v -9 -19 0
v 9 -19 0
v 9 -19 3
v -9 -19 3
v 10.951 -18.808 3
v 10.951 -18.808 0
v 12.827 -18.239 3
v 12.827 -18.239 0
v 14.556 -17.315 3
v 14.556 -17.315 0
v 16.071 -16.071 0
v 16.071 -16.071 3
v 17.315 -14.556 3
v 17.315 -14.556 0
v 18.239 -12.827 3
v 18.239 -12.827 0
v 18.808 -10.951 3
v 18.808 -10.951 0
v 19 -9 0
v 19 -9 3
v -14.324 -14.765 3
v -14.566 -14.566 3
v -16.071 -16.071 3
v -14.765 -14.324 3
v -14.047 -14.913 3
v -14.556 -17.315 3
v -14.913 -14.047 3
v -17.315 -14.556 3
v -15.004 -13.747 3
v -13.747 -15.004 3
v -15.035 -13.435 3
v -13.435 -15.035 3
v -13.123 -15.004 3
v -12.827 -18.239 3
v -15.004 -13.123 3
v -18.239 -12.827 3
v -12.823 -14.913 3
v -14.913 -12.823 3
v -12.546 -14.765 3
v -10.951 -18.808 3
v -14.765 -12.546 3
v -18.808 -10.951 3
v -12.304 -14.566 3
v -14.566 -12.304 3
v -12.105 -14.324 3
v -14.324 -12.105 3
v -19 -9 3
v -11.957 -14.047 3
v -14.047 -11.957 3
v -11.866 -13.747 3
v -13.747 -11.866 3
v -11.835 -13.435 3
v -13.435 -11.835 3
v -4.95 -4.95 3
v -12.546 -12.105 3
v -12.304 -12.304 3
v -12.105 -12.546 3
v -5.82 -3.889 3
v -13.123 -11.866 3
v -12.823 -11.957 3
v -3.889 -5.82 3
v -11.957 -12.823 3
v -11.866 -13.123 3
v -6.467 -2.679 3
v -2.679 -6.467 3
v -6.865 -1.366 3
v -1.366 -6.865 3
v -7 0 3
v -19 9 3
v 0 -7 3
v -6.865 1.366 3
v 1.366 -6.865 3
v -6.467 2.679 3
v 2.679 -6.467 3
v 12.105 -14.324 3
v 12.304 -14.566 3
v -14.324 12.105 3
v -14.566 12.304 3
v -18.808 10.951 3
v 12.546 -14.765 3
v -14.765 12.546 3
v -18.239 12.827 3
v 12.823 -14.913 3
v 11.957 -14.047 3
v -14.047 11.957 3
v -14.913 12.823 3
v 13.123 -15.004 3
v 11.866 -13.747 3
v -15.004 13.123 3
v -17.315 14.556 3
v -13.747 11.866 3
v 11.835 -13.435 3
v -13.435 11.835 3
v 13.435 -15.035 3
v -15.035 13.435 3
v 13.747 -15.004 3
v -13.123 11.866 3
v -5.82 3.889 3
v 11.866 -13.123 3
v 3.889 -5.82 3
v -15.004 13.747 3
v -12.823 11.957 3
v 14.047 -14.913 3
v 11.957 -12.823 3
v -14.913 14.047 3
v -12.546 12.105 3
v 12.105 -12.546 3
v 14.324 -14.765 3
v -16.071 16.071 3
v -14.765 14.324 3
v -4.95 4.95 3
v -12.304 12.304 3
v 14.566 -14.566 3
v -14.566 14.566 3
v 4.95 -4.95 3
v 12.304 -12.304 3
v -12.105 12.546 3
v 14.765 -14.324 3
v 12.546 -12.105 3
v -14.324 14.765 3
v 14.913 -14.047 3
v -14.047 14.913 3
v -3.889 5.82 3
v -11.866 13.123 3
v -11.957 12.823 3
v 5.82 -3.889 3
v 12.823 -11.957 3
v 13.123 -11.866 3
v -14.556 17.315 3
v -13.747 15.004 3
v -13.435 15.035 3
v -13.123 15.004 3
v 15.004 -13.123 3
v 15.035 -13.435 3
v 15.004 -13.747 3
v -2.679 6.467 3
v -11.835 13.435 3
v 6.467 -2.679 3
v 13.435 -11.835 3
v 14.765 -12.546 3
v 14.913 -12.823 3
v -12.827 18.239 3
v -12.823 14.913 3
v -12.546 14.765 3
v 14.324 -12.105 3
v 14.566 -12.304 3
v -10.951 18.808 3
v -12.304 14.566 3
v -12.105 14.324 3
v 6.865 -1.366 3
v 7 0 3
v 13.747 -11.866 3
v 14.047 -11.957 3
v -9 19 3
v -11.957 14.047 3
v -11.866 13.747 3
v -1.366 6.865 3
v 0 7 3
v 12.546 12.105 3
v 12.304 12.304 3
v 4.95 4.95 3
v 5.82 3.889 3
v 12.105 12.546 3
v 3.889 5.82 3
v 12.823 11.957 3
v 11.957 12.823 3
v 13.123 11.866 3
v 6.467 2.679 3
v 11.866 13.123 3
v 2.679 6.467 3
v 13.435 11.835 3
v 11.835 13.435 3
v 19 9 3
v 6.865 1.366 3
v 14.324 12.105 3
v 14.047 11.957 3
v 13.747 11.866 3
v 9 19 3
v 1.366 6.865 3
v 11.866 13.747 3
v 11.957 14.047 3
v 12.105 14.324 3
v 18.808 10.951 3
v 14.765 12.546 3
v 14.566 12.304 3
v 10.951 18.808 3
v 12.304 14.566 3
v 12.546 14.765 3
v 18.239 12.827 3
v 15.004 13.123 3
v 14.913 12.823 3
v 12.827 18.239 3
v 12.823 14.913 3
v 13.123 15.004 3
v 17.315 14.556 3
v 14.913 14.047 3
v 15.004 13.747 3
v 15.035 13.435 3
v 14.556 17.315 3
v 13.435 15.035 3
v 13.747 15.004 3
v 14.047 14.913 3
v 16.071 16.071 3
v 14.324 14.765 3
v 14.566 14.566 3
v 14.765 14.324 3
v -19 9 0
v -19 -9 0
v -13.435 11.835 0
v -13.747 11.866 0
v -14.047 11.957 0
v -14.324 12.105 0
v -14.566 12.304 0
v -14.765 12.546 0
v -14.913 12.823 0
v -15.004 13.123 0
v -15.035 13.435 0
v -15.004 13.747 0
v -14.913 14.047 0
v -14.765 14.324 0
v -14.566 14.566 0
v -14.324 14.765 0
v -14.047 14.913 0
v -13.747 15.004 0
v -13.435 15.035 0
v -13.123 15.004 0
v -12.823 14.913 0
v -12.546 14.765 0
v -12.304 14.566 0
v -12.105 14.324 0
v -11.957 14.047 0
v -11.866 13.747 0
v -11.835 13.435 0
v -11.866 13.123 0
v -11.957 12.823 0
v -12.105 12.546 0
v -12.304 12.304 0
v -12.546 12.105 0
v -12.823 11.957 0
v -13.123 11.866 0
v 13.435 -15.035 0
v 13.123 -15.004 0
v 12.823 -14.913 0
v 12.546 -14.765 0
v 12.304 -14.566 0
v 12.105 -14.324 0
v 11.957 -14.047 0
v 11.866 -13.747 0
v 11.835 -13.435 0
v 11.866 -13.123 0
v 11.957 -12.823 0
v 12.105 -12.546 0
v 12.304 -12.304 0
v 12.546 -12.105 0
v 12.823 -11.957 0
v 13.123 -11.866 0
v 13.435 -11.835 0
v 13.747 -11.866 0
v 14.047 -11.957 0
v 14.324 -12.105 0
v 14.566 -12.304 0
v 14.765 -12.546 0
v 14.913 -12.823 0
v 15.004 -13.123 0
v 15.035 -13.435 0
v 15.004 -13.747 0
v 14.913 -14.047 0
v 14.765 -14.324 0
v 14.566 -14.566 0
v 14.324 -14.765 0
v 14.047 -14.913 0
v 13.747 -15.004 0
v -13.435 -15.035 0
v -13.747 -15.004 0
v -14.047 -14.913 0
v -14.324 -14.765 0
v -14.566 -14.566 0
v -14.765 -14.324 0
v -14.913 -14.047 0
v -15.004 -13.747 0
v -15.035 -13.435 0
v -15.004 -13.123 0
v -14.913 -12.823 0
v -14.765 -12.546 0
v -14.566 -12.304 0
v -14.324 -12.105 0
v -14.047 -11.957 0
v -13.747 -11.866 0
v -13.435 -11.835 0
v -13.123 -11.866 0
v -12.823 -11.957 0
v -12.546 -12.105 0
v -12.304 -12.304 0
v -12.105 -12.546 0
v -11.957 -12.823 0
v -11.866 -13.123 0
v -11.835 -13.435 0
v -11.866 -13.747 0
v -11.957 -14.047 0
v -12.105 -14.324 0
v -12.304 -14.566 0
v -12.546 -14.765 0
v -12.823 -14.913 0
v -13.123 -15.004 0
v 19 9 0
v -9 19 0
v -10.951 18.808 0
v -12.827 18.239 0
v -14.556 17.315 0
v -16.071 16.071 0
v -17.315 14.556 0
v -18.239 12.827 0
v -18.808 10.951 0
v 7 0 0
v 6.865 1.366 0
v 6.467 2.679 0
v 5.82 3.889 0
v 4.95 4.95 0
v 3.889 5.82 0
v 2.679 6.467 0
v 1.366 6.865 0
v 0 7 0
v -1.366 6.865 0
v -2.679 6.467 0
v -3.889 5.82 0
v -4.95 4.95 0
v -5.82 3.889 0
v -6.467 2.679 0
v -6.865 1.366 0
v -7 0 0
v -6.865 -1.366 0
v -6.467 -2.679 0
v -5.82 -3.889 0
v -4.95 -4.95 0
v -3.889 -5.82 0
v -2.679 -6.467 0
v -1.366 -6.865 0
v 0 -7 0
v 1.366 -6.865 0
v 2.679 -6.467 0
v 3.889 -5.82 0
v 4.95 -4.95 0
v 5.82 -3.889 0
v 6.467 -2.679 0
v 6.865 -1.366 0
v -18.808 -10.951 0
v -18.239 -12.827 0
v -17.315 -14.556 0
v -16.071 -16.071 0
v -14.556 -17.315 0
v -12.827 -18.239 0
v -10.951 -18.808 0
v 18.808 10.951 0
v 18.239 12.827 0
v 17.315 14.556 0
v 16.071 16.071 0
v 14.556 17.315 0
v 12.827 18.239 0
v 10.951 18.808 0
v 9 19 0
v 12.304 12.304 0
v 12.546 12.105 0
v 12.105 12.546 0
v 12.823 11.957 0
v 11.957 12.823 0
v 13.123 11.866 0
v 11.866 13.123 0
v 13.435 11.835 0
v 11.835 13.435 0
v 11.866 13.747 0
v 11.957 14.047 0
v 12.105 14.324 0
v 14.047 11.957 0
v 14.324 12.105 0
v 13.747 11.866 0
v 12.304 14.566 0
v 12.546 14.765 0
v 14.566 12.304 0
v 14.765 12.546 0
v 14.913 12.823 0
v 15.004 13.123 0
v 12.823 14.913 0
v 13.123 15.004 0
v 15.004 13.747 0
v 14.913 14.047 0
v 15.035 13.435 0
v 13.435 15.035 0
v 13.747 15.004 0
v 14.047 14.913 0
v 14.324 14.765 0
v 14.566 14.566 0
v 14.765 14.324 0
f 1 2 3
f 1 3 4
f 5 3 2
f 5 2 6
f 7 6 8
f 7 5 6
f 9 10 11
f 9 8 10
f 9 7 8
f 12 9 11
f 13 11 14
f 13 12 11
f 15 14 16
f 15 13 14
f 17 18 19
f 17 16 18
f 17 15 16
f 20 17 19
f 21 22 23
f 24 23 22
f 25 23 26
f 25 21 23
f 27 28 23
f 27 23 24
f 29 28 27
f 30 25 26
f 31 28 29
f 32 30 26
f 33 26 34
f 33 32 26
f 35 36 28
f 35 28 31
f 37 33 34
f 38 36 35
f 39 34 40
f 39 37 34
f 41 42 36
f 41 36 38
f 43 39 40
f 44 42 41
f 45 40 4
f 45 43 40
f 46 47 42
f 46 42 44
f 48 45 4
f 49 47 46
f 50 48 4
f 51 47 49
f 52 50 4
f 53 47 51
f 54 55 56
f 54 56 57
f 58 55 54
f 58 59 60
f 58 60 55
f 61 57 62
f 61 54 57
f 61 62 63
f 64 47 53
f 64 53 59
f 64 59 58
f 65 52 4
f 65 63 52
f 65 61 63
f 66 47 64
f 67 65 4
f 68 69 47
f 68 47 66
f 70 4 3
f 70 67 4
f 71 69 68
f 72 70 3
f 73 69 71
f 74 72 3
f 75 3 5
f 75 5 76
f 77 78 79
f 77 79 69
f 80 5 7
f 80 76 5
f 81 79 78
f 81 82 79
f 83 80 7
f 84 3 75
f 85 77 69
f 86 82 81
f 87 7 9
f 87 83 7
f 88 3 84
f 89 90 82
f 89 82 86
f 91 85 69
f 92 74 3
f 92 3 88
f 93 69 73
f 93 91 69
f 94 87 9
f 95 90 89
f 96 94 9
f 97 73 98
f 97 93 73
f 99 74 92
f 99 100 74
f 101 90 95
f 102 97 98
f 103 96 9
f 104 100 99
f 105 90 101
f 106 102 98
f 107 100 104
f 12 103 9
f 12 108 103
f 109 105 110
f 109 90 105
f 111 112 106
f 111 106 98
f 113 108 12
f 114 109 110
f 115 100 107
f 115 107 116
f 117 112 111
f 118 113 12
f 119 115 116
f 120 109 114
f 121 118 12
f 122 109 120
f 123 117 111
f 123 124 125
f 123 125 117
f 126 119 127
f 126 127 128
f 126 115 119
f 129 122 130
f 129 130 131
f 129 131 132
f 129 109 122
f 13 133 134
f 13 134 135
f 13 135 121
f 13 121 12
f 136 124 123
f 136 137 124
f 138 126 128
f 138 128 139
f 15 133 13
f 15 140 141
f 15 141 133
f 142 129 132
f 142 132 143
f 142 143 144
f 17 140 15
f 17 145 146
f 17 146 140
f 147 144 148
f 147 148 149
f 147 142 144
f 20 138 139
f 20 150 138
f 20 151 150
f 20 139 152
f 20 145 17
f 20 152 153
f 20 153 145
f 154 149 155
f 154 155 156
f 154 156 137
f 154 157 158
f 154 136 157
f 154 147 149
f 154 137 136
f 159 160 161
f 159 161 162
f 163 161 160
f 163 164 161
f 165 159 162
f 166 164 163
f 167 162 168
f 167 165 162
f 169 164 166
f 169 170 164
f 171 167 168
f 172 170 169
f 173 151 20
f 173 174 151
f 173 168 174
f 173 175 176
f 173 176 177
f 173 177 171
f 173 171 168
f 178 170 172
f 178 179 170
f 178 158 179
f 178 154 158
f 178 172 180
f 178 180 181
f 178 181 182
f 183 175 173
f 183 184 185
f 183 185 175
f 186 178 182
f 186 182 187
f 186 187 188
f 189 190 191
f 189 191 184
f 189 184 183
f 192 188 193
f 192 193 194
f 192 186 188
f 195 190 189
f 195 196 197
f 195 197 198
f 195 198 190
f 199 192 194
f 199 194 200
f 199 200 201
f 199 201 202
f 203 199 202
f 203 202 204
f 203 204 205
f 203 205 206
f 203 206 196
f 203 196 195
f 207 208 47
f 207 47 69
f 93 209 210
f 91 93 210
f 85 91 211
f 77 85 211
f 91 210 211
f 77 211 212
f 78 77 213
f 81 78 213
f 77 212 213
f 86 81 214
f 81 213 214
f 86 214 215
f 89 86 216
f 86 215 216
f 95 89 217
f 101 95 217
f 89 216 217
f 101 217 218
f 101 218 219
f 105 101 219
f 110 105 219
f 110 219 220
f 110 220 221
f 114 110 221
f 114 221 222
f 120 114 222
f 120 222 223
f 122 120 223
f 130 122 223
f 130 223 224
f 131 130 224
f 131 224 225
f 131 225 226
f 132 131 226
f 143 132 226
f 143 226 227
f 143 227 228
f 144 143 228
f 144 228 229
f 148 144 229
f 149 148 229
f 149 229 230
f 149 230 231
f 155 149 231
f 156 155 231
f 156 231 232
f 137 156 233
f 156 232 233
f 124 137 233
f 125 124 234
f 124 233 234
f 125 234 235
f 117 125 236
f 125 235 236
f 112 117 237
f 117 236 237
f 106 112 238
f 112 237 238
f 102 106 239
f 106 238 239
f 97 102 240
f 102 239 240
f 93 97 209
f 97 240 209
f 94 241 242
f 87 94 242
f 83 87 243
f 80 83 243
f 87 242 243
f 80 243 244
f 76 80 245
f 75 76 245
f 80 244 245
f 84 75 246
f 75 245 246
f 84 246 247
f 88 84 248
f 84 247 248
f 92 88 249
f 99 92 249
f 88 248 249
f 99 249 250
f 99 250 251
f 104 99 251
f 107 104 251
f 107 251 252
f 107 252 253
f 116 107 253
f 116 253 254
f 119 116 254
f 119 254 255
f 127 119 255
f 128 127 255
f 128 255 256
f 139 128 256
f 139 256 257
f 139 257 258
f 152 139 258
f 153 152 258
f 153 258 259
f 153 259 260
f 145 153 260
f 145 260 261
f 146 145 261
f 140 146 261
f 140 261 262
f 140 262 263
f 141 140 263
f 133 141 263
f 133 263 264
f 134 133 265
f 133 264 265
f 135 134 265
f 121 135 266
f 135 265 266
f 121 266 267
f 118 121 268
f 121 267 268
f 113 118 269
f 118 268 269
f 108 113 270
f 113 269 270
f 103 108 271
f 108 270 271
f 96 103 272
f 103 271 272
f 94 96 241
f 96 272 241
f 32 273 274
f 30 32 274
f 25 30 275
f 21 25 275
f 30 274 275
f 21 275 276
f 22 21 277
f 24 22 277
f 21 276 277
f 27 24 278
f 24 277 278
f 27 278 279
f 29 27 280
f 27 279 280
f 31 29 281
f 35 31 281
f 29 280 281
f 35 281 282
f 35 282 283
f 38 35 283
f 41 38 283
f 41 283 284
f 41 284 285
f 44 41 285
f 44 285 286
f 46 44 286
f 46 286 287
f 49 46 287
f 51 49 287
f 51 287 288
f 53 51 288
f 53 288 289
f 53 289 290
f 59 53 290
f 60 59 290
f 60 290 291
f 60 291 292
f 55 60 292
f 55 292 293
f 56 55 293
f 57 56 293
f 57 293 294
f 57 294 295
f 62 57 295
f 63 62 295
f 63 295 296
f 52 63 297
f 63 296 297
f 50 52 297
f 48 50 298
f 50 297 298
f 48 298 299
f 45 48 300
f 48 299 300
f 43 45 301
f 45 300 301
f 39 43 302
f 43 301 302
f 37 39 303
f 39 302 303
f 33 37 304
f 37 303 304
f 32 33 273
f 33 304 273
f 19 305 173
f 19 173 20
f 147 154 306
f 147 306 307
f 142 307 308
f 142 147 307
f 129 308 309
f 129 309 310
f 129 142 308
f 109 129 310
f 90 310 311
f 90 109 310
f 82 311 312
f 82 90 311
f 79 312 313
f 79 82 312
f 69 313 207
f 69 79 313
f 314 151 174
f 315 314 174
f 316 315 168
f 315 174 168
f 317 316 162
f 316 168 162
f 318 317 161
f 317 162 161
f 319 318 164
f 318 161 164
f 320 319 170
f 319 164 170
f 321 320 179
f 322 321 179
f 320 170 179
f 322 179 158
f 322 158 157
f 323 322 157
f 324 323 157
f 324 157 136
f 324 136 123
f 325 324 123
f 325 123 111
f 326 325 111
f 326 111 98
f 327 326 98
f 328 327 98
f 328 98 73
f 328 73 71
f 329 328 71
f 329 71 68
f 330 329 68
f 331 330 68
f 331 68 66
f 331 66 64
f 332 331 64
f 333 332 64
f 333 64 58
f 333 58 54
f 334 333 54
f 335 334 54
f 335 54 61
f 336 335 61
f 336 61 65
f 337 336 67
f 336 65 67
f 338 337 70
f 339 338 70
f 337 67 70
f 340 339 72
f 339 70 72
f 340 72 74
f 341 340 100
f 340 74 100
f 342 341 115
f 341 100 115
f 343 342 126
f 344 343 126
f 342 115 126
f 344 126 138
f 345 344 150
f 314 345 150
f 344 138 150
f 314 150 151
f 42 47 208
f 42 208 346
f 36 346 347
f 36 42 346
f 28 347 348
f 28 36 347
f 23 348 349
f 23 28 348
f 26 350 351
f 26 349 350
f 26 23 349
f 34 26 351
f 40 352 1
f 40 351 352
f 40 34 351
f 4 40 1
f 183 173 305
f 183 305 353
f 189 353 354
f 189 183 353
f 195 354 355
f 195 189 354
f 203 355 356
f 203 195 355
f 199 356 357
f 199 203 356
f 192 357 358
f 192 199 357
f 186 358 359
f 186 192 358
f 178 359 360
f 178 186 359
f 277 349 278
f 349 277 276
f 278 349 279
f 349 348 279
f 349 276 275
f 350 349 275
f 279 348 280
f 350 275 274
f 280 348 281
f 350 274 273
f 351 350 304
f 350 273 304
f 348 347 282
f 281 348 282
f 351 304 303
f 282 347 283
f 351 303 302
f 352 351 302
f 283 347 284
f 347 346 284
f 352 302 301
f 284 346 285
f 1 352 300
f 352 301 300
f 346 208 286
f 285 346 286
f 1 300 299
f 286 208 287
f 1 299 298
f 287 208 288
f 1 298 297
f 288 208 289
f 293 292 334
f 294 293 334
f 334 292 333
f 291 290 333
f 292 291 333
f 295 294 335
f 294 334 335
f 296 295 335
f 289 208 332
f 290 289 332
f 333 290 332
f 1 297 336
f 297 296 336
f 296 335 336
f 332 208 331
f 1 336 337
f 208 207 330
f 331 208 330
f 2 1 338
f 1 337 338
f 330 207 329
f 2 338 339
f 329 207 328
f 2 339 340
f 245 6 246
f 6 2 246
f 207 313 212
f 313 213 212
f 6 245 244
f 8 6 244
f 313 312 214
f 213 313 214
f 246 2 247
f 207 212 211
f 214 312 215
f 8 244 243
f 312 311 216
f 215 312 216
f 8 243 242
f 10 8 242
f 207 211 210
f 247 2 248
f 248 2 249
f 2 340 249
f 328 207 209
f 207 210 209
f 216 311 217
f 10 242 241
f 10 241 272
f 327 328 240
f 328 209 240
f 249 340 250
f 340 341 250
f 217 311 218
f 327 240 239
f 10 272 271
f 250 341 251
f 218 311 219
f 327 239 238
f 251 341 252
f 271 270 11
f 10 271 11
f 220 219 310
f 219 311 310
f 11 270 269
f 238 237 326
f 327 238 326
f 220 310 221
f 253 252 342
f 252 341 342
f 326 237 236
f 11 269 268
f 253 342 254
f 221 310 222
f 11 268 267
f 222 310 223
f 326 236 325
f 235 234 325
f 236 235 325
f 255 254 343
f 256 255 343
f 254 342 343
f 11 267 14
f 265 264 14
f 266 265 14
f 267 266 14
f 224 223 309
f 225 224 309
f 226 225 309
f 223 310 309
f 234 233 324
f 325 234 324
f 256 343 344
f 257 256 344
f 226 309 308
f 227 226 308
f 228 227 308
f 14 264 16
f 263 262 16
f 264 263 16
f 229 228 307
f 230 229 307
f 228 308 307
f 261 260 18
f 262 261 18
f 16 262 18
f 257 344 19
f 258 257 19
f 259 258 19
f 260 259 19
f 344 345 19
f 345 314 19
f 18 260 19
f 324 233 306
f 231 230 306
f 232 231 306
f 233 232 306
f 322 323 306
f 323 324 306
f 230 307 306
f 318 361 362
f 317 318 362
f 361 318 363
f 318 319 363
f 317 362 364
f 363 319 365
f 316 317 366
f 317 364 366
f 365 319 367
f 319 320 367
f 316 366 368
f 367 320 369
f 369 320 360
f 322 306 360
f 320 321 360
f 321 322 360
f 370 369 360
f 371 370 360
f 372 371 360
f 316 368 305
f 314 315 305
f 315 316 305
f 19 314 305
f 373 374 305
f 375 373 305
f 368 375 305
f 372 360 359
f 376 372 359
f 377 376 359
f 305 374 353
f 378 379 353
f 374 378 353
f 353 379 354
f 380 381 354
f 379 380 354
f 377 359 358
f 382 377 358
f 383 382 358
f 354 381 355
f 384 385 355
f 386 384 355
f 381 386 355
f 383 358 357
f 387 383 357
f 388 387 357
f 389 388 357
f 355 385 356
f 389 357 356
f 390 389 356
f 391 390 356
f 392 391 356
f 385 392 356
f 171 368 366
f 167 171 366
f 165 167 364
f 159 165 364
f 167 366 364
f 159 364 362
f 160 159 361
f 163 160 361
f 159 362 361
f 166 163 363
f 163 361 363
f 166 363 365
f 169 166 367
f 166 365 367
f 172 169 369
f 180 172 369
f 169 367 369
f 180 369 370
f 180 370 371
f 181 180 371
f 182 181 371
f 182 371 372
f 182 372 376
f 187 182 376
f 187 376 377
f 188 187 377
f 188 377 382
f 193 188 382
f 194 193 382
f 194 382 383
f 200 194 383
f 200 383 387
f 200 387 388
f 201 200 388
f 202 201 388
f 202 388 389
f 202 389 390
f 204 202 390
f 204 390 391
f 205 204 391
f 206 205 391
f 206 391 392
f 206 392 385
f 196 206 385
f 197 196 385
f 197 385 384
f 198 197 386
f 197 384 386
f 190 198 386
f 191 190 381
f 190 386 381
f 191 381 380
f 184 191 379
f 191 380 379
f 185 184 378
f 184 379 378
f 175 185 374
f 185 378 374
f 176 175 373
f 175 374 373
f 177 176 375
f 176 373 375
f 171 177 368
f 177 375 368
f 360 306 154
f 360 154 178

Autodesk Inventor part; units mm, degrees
ref_plane "YZ Plane" through (0, 0, 0) normal (1, 0, 0) x (0, 1, 0)
ref_plane "XZ Plane" through (0, 0, 0) normal (0, 1, 0) x (-1, 0, 0)
ref_plane "XY Plane" through (0, 0, 0) normal (0, 0, 1) x (1, 0, 0)
sketch "スケッチ1" plane through (0, 0, 0) normal (0, 0, 1) x (1, 0, 0)
  circle A0 centre (0, 0) radius 19
  line L0 (-19, 19) -> (19, 19)
  line L1 (19, 19) -> (19, -19)
  line L2 (19, -19) -> (-19, -19)
  line L3 (-19, -19) -> (-19, 19)
  dimension "d0" = 38
extrude "押し出し1" add sketch "スケッチ1" along normal blind 3
sketch "スケッチ2" plane through (0, 0, 3) normal (0, 0, 1) x (1, 0, 0)
  circle A0 centre (0, 0) radius 7
  dimension "d3" = 14
extrude "押し出し2" cut sketch "スケッチ2" against normal blind 3
sketch "スケッチ3" plane through (0, 0, 3) normal (0, 0, 1) x (1, 0, 0)
  circle A0 centre (0, 0) radius 19
  line L0 (0, 0) -> (-13.435, 13.435)
  line L1 (0, 0) -> (0, 19)
  point P0 (-13.435, -13.435)
  point P1 (13.435, -13.435)
  point P2 (13.435, 13.435)
  dimension "d6" = 38
  dimension "d7" = 45
  dimension "d10" = 360
hole "穴1" at (-13.435, 13.435, 3) at (-13.435, -13.435, 3) at (13.435, -13.435, 3) at (13.435, 13.435, 3) direction (0, 0, -1) diameter 3.2 end through all
fillet "フィレット1" radius 10 4 edges at (-19, 19, 1.5) (19, 19, 1.5) (19, -19, 1.5) (-19, -19, 1.5)
properties part number "hand1_part3" material "アルミニウム 6061"
